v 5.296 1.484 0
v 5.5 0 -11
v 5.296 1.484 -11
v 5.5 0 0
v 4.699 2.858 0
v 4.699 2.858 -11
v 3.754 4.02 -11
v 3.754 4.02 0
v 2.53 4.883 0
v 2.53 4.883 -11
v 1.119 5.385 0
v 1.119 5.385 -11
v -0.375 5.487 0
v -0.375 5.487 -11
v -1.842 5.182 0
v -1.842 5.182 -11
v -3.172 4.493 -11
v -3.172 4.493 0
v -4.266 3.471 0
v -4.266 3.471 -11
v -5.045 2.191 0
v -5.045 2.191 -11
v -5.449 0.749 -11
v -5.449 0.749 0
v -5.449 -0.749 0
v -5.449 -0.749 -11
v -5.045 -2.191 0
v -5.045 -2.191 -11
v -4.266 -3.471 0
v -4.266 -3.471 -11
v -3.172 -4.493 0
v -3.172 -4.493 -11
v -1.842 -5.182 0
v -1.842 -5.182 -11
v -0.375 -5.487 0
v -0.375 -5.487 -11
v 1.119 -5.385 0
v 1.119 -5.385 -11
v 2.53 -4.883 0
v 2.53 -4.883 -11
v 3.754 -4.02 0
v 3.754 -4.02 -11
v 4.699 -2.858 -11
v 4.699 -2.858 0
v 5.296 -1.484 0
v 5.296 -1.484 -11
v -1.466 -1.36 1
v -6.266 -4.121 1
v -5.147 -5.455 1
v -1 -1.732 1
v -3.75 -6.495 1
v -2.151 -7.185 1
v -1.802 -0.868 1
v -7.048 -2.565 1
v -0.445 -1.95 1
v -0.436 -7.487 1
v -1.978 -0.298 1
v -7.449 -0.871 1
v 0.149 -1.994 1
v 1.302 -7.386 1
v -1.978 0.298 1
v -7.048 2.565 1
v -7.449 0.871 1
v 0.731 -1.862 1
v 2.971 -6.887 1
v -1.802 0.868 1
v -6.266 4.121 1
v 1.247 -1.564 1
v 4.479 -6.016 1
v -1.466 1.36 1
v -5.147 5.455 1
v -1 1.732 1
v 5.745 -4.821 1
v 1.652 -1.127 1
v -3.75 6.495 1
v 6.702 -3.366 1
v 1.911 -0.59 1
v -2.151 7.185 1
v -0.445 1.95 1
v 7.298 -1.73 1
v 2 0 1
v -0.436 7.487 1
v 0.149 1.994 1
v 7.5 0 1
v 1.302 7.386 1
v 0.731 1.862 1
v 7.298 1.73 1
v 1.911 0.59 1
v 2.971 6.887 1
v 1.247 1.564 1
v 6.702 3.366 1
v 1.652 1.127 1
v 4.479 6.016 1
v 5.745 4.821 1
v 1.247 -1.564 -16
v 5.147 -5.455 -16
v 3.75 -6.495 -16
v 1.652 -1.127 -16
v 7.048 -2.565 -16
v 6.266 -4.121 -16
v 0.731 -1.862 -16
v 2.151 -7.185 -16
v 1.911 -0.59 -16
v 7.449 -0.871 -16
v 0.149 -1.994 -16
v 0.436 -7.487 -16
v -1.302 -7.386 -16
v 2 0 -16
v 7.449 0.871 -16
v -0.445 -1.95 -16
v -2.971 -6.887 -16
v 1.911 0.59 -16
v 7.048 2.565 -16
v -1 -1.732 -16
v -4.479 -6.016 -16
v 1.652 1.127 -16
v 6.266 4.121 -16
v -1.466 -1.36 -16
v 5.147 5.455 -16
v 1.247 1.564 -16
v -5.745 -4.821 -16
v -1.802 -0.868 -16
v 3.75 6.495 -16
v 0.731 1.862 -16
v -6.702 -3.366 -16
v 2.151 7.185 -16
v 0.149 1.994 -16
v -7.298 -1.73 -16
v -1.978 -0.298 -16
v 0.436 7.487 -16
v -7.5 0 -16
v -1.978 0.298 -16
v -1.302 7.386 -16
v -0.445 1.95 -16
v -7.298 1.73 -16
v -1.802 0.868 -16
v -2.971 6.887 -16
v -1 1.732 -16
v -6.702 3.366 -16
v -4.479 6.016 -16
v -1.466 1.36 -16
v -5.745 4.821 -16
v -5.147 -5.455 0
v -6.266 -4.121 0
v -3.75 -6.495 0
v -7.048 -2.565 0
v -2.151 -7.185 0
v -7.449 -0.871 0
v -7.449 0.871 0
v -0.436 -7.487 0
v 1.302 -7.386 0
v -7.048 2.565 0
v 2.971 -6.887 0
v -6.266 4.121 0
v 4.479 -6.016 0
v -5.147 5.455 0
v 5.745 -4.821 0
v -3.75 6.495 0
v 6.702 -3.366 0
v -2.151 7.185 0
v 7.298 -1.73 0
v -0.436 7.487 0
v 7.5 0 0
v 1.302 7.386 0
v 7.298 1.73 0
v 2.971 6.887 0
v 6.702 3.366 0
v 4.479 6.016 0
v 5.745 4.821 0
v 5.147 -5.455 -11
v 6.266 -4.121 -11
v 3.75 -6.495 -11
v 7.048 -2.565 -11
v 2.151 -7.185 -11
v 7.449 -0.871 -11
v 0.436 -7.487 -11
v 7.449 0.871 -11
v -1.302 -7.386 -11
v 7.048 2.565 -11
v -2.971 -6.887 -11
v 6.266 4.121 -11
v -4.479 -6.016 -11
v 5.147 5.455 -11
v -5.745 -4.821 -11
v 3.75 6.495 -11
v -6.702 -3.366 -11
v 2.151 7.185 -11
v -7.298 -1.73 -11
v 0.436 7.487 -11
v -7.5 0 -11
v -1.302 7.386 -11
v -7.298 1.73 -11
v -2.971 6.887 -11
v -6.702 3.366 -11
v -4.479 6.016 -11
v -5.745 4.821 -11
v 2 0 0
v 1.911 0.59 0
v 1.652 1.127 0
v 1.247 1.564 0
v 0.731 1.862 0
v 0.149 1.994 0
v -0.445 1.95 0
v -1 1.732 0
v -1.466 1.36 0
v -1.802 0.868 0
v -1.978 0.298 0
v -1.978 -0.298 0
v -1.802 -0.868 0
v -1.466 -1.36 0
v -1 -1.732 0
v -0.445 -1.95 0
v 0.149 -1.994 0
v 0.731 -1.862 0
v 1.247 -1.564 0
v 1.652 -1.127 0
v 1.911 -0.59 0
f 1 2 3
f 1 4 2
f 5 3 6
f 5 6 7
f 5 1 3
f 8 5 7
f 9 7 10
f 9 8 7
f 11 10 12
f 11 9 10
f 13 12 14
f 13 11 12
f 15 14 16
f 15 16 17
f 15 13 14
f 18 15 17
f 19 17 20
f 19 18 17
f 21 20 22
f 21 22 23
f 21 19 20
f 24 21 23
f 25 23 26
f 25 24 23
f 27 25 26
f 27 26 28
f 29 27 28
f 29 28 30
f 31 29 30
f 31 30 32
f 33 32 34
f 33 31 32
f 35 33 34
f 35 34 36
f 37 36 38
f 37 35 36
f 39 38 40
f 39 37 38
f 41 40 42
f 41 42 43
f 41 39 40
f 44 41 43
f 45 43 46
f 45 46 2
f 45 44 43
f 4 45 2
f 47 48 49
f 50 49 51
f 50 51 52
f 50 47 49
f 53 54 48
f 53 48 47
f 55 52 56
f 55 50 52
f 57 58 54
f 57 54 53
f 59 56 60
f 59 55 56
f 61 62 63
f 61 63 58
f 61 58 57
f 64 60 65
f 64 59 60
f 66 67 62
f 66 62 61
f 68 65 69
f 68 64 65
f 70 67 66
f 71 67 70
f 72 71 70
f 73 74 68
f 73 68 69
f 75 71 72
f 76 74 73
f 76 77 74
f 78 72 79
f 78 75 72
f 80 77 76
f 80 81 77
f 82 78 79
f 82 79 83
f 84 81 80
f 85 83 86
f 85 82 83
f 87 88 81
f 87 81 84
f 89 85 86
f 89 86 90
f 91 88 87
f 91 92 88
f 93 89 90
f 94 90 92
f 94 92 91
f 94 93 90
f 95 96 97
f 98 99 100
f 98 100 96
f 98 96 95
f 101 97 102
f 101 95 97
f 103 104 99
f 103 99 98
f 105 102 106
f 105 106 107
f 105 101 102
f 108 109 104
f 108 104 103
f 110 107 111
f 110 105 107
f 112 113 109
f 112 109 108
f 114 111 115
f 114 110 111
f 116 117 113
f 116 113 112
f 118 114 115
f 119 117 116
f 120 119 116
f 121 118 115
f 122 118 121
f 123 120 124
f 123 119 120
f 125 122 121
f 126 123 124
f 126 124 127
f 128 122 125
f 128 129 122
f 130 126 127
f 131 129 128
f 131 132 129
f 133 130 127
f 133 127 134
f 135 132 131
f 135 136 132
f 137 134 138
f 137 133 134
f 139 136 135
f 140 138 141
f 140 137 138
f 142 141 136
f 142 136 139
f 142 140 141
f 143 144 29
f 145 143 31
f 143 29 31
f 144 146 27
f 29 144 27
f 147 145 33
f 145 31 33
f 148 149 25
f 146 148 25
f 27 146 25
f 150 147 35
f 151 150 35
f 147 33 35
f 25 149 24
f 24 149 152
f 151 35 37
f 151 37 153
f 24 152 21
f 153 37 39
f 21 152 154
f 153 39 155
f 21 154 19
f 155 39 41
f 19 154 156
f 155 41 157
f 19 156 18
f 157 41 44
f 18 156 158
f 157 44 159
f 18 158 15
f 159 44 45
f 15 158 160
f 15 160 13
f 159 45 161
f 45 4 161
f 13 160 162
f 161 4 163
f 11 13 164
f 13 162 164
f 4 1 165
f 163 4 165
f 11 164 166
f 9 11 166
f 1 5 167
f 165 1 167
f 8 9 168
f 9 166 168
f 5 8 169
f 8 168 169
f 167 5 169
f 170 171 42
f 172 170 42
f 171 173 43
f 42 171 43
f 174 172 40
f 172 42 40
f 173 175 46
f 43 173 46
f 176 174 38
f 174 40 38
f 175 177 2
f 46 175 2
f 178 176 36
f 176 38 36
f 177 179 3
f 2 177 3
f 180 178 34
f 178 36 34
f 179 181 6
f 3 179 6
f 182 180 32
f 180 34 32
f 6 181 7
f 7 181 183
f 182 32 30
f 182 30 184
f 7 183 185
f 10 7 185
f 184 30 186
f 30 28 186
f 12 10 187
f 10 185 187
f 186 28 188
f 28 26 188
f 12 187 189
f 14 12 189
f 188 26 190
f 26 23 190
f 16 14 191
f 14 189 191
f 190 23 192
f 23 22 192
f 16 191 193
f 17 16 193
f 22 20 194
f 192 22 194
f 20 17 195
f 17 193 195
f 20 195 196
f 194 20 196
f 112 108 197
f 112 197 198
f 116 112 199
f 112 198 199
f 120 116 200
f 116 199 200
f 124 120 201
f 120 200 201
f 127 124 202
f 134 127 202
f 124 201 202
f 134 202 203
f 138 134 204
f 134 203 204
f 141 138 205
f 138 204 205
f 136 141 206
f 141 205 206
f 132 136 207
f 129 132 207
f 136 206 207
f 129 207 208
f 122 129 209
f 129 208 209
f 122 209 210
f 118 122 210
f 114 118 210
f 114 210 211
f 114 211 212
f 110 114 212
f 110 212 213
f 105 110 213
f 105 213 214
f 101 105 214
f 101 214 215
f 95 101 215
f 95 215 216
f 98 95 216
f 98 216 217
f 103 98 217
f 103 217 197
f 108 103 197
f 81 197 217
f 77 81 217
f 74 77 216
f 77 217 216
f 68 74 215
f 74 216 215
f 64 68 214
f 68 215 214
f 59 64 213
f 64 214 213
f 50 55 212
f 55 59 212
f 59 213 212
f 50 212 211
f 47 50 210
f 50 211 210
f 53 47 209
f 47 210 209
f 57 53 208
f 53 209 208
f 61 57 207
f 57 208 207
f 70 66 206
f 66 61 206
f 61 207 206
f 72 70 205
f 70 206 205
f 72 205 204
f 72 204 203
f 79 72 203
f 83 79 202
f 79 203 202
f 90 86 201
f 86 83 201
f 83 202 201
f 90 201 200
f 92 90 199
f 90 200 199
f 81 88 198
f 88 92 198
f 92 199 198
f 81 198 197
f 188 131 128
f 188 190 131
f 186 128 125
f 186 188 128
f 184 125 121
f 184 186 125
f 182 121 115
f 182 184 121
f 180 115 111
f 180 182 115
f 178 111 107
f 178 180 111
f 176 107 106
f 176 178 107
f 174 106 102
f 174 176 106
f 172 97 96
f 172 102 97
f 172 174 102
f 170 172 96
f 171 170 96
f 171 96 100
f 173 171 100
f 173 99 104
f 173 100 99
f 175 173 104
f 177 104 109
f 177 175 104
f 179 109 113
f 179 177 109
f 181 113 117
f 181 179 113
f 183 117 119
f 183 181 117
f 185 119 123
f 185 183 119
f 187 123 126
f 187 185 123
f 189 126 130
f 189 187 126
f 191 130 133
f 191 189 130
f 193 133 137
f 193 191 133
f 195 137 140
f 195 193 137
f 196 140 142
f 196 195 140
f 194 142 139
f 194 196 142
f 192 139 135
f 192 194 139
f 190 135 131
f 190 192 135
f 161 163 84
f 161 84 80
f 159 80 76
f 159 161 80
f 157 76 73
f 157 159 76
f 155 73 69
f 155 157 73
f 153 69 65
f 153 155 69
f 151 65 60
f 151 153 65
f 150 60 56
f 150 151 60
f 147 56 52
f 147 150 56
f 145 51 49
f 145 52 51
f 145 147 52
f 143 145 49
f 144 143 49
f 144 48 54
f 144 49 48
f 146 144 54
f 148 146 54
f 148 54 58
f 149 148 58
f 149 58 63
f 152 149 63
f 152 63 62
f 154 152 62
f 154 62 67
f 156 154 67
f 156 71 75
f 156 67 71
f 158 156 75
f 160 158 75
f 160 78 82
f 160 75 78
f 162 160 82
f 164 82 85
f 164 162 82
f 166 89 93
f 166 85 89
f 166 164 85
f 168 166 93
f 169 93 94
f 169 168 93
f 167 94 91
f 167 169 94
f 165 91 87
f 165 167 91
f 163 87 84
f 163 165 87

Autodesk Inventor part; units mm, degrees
ref_plane "YZ Plane" through (0, 0, 0) normal (1, 0, 0) x (0, 1, 0)
ref_plane "XZ Plane" through (0, 0, 0) normal (0, 1, 0) x (-1, 0, 0)
ref_plane "XY Plane" through (0, 0, 0) normal (0, 0, 1) x (1, 0, 0)
sketch "Skizze1" plane through (0, 0, 0) normal (0, 0, 1) x (1, 0, 0)
  circle A0 centre (0, 0) radius 7.5
  circle A1 centre (0, 0) radius 5.5
  circle A2 centre (0, 0) radius 2
  dimension "d0" = 15
  dimension "d3" = 11
  dimension "d9" = 4
extrude "Extrusion2" add sketch "Skizze1" against normal blind 11 contours A1 | A2
sketch "Skizze2" plane through (0, 0, -11) normal (0, 0, -1) x (-1, 0, 0)
  circle A0 centre (0, 0) radius 7.5
  dimension "d6" = 15
extrude "Extrusion3" add sketch "Skizze2" along normal blind 5
extrude "Extrusion4" cut sketch "Skizze1" along normal mid plane 50 contours A2
extrude "Extrusion5" add sketch "Skizze1" along normal blind 1 contours A0 | A1
properties part number "Timing belt pulley"
